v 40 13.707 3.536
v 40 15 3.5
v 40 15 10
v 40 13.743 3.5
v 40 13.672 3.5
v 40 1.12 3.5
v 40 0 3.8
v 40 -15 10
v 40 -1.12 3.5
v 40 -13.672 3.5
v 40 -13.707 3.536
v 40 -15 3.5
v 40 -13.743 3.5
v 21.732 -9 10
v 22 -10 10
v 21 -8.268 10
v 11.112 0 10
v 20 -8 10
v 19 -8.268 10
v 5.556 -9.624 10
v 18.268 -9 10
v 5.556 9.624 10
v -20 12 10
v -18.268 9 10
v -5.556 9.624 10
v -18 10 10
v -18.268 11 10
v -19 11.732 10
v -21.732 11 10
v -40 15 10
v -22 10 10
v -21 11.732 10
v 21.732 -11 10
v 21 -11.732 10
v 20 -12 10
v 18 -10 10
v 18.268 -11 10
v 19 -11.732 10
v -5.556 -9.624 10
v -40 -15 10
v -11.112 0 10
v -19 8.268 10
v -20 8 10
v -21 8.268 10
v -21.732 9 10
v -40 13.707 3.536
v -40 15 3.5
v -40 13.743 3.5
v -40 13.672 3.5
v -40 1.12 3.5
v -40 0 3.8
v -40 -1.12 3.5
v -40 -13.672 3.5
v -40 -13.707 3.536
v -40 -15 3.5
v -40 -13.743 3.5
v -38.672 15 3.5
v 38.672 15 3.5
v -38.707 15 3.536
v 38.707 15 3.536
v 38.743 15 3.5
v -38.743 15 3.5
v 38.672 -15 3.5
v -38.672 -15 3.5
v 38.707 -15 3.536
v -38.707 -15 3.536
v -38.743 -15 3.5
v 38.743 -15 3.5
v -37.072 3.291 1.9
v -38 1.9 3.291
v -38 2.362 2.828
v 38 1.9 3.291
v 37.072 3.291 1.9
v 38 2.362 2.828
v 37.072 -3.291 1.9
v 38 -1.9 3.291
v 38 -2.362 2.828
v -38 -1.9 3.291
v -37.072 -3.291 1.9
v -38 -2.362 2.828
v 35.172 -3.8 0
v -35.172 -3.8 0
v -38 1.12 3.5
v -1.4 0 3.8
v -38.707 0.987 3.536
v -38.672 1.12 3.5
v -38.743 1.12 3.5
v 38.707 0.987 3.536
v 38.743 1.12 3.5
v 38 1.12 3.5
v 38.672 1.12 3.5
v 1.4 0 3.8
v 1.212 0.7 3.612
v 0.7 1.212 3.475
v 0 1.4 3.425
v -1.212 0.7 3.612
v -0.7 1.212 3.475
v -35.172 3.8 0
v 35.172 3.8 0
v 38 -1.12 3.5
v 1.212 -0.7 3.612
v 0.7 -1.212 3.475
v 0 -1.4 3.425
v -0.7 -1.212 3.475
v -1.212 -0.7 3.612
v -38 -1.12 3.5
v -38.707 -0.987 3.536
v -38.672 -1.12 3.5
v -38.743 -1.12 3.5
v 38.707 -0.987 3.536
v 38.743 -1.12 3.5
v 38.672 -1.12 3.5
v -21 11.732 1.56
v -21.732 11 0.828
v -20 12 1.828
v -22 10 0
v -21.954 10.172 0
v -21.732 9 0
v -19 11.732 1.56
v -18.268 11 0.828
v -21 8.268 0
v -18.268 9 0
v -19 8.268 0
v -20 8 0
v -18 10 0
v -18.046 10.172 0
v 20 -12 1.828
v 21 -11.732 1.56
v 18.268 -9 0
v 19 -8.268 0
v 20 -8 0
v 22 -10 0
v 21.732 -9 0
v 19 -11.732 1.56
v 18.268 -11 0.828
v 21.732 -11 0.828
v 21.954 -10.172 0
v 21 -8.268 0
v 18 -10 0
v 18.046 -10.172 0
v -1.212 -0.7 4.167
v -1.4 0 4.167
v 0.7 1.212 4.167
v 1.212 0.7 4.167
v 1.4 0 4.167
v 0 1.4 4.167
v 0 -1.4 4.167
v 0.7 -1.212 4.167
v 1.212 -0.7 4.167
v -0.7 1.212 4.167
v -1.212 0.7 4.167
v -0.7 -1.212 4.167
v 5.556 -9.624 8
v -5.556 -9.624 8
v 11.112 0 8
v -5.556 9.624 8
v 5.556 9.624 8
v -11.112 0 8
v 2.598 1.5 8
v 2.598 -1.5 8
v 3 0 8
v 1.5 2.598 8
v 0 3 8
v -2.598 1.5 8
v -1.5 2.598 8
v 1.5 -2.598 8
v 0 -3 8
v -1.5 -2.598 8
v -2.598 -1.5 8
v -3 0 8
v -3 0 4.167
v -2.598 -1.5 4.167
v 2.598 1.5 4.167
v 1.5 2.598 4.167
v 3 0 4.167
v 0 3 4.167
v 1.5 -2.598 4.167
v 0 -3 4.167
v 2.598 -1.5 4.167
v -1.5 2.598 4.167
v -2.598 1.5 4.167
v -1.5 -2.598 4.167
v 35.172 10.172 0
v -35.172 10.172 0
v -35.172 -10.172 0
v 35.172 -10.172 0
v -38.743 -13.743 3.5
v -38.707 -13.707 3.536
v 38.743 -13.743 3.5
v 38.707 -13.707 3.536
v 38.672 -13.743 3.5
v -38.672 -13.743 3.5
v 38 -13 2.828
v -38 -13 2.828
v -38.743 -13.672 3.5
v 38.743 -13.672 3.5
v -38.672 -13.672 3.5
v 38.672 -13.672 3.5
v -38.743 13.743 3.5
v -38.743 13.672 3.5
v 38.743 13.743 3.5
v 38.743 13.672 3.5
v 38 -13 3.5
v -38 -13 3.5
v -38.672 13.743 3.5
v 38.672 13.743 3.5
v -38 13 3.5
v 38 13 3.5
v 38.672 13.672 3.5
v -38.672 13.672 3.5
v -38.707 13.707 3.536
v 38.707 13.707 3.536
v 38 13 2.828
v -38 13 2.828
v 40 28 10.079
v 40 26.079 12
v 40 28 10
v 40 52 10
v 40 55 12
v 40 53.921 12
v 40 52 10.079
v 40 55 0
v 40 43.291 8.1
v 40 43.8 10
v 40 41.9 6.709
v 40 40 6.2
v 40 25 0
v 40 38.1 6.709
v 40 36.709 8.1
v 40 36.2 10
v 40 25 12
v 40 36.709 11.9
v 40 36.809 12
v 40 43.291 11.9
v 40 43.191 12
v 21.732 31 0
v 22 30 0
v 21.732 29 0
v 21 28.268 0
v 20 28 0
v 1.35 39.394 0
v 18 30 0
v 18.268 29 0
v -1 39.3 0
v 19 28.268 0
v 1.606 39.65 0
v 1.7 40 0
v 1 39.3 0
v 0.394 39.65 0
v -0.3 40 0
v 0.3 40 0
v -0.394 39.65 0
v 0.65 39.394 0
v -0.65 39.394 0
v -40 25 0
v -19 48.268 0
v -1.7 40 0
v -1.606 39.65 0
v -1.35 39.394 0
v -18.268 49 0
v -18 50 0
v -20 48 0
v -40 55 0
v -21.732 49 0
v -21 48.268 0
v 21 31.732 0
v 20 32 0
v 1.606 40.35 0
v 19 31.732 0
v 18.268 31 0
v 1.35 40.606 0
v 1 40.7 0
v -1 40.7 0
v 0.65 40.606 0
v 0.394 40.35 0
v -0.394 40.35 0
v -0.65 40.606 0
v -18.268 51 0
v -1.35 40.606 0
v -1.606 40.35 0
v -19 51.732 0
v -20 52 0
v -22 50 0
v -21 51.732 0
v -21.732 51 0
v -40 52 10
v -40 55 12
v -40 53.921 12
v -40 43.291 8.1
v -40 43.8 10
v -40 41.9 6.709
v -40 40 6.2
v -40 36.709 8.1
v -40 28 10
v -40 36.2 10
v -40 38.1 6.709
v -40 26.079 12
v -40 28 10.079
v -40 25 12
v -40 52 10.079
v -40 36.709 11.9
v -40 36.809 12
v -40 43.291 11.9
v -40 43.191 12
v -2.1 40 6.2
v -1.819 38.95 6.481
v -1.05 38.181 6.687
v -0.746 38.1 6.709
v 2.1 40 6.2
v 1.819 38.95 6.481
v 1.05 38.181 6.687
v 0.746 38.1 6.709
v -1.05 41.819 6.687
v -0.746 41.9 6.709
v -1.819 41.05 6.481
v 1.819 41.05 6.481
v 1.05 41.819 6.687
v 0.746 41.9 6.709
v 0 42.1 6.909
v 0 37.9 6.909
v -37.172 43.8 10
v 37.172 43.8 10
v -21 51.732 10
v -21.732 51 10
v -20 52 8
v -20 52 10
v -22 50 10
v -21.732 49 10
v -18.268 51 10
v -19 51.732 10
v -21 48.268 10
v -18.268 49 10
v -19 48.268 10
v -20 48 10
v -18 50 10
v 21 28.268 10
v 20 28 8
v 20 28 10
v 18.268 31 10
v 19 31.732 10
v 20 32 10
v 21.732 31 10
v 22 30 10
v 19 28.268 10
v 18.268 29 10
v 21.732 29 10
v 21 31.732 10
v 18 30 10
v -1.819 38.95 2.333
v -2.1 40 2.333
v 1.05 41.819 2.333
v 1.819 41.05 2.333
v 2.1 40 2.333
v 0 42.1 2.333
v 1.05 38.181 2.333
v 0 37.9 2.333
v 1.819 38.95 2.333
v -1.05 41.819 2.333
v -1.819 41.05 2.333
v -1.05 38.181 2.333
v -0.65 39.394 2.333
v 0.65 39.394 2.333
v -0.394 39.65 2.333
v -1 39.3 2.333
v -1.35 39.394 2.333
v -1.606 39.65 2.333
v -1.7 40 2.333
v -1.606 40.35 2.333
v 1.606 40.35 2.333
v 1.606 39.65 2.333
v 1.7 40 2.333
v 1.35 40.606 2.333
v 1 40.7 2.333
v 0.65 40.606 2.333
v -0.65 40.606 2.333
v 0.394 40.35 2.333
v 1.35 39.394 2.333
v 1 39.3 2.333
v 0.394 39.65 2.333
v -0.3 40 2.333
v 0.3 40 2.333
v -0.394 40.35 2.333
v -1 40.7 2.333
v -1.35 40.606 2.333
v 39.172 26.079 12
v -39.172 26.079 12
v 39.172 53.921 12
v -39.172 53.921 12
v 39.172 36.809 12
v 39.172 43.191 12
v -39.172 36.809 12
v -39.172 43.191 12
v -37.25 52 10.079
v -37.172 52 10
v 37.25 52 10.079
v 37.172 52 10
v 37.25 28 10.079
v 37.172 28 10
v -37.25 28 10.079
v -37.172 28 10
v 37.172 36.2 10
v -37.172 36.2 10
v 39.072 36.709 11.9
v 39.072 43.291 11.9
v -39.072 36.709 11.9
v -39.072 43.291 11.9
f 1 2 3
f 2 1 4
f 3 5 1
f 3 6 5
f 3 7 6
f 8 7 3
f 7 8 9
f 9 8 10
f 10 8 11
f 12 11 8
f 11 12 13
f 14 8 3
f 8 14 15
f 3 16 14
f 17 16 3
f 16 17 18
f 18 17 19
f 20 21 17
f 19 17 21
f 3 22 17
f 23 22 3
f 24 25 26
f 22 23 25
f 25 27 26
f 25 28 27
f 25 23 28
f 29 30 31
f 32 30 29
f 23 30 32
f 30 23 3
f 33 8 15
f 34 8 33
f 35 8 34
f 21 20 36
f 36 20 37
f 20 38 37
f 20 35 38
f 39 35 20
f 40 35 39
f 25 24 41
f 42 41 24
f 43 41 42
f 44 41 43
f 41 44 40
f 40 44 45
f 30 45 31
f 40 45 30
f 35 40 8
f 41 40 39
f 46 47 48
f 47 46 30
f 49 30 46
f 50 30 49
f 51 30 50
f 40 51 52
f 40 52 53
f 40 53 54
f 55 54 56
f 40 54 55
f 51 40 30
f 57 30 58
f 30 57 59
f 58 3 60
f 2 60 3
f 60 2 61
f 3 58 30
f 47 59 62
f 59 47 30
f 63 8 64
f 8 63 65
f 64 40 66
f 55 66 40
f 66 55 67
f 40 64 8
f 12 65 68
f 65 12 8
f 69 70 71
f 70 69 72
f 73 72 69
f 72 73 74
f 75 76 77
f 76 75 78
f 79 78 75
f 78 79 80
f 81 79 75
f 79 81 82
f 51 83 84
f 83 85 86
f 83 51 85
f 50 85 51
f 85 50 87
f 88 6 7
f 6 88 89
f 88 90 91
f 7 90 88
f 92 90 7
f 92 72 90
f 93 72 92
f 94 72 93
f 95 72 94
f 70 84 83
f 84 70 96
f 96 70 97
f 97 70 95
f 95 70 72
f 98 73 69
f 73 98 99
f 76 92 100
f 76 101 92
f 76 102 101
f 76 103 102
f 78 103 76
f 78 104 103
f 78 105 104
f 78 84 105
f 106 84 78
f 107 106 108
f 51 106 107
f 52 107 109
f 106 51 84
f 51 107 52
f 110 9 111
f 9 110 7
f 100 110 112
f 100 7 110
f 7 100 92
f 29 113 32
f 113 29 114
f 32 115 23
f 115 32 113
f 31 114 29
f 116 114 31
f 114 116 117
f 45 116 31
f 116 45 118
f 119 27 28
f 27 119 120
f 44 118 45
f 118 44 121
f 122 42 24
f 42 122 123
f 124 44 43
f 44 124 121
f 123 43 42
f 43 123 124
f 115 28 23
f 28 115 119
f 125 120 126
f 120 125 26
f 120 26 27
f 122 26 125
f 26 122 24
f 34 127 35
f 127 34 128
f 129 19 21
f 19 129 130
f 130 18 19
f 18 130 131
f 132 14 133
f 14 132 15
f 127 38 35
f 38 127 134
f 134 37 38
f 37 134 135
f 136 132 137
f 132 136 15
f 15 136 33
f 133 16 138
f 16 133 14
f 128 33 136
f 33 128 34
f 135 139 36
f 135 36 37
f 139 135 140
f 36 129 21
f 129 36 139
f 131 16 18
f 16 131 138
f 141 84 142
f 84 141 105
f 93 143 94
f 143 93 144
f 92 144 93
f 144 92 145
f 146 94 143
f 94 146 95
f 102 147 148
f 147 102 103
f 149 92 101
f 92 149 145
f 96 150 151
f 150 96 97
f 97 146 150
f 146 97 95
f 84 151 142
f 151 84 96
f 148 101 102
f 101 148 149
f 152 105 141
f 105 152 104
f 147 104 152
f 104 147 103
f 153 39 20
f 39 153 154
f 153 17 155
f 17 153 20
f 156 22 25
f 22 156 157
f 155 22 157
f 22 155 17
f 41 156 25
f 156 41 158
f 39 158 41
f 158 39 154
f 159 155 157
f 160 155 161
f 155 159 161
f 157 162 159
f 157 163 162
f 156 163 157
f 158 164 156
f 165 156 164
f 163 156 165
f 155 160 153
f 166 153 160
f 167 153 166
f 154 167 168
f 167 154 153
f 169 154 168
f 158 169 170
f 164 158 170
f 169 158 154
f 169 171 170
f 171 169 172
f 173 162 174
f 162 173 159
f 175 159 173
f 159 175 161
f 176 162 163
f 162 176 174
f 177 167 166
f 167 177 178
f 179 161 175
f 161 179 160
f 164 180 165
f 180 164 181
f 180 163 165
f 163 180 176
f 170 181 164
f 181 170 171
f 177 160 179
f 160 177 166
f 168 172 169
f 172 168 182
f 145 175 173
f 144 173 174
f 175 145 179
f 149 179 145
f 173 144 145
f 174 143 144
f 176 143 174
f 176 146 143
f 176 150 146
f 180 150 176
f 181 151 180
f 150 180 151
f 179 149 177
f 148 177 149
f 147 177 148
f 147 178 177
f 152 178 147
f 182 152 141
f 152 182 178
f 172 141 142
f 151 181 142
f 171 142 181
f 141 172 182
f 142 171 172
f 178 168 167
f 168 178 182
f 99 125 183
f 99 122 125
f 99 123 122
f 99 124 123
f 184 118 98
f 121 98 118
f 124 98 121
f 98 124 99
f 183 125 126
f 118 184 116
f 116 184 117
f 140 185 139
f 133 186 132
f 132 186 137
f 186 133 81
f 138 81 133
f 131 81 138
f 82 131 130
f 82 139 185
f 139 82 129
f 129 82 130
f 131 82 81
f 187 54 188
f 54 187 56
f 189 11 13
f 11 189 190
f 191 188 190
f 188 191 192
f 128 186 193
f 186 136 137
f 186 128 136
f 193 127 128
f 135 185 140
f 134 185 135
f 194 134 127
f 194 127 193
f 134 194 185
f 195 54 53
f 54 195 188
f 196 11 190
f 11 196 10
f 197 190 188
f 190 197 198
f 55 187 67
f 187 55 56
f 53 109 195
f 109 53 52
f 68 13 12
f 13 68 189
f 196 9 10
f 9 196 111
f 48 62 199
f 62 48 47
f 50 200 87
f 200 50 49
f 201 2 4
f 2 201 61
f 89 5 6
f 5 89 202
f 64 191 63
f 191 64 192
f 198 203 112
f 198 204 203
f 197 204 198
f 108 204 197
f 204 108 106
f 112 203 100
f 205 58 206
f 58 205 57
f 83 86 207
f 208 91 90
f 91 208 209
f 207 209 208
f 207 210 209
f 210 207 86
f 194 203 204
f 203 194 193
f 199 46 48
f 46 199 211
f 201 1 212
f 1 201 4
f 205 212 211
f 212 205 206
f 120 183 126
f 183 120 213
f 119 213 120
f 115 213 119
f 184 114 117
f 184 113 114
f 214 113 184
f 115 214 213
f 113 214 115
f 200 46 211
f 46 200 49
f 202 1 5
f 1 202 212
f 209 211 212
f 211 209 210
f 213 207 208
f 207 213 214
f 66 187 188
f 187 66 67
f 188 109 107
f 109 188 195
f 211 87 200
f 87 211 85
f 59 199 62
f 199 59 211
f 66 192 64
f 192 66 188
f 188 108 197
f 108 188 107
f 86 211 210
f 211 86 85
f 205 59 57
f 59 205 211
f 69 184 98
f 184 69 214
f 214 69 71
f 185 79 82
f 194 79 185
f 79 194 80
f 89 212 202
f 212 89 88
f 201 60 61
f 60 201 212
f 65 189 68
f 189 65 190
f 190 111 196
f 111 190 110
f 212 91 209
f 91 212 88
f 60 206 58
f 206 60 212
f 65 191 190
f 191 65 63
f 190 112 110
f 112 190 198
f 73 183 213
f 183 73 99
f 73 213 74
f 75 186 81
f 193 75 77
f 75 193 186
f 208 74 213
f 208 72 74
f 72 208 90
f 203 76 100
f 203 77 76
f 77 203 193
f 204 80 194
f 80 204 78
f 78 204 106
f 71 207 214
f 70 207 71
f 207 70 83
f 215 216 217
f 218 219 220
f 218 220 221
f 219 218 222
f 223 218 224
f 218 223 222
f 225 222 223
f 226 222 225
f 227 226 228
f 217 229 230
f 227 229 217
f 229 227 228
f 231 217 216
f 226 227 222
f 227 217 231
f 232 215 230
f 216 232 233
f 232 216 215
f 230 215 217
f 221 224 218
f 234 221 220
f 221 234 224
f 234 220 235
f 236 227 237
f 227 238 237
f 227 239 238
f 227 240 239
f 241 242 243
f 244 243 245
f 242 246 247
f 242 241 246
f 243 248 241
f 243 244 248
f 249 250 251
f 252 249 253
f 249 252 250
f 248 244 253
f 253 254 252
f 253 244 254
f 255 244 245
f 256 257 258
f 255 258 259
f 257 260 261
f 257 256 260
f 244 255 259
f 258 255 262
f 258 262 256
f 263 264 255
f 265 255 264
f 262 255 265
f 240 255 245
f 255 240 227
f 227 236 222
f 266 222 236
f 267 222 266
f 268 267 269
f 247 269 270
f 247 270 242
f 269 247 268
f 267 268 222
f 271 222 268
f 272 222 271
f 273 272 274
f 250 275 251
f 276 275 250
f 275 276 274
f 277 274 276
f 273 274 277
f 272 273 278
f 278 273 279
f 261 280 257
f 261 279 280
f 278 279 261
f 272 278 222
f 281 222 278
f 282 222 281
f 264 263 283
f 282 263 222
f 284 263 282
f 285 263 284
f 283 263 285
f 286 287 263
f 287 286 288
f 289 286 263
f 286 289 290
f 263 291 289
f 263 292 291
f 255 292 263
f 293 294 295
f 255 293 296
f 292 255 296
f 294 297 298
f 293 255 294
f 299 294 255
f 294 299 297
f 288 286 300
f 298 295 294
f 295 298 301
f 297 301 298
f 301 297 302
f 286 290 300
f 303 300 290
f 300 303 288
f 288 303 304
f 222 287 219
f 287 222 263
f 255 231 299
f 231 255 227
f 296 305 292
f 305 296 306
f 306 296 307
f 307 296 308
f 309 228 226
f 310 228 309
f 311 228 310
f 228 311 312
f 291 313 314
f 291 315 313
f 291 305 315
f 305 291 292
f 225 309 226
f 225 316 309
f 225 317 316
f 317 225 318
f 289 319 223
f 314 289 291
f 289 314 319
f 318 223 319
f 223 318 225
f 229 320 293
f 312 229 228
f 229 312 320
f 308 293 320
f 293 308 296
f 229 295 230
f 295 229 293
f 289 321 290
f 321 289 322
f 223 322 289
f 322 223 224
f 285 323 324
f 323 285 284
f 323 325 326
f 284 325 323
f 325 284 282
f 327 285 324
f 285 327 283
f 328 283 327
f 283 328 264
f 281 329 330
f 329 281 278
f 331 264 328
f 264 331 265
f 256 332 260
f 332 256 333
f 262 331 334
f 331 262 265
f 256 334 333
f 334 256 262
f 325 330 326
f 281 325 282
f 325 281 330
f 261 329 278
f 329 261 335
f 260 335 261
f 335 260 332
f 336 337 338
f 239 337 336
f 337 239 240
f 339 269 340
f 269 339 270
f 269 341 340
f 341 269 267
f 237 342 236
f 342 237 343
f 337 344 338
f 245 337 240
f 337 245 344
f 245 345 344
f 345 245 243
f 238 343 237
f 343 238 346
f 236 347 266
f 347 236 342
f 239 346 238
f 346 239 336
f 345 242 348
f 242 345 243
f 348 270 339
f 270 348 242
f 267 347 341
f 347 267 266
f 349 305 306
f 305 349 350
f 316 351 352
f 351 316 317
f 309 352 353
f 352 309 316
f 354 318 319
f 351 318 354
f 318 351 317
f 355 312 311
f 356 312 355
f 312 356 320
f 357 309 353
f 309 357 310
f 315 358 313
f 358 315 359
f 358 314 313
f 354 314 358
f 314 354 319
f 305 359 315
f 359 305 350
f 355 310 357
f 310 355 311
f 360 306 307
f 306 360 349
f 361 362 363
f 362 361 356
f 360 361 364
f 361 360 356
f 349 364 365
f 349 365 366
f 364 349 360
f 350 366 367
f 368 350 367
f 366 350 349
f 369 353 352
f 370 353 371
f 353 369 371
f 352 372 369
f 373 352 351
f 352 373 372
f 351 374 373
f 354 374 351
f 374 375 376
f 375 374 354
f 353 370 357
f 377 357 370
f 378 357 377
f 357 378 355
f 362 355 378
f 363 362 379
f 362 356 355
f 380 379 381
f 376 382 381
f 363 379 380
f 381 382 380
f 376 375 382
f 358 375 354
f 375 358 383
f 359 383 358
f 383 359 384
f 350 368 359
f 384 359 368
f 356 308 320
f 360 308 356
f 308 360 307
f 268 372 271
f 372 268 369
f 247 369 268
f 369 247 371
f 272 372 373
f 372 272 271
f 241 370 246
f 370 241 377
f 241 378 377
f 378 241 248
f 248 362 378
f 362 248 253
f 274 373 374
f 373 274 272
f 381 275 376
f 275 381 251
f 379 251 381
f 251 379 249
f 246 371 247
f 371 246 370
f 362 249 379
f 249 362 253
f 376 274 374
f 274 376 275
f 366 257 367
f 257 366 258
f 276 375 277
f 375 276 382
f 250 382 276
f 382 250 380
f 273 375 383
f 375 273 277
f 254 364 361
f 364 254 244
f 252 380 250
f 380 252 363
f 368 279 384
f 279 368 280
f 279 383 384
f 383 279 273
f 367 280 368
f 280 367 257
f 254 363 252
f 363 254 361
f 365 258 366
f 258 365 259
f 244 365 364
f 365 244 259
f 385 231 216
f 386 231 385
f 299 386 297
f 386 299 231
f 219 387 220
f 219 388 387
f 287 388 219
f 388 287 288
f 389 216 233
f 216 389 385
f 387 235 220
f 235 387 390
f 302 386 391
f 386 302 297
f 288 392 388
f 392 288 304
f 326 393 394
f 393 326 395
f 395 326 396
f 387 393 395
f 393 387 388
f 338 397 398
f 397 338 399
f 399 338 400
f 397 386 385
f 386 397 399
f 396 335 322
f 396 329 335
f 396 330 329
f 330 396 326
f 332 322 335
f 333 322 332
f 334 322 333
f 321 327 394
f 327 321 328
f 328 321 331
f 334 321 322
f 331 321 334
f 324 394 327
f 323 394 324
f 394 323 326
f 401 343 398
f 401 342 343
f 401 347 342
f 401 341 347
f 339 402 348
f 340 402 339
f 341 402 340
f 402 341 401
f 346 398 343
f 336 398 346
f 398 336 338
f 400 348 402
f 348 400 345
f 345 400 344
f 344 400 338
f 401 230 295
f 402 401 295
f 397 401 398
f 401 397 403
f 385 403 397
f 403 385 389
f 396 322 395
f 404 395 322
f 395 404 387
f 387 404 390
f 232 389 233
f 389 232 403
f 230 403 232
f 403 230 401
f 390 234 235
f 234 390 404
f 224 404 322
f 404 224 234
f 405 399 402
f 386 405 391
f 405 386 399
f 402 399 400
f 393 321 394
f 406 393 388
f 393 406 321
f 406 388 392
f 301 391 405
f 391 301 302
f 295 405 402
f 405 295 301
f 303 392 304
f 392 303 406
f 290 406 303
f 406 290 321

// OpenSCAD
//
// Optical sensor to receive glass tube.
//
// dimensions subject to change, see variables
// at the bottom of this file
// 

  smooth = 12;  // Number of facets for round features
  hex = 6;
	length = 80; // mm   (76mm = 3") Main Block
	width  = 30; // mm
	thick = 20;  // mm
   dia  =  7.6; // 7.14 = (9*25.4)/32; // 6.4;  // 1/4 inch in mm
  sixscrewrad = 2; // 3.6mm = .146 = #6 screw hole
  heatsinkradius = 25.4*(7/16);
  ledradius = 3;
  phototransradius = 2.1;
  lighthole = 1.4;
  
  thickplus = thick + 2;  // plus margin
  lengthplus = length + 2;
  widthplus = width + 1;

module photohalf()
{
difference() {
	translate([0,width/2-1.5,0])
      cube([length,3,4],center=true);
	translate([0,width/2-3.2,2])
    rotate([-45,0,0])
      cube([length,3,4],center=true);
}

difference() {
	translate([0,1.5-width/2,0])
      cube([length,3,4],center=true);

	translate([0,3.2-width/2,2])
     rotate([45,0,0])
      cube([length,3,4],center=true);
}

difference() {

	sensor();
   translate([0,0,thick/2])
     cube([length+1,widthplus,thick],center=true);

   };
}

module ledhalf()
{

   difference() {
	  sensor();
     translate([0,0,-thick/2])
      cube([length+1,widthplus,thick],center=true);
	translate([0,2-width/2,0])
    rotate([45,0,0]) 
      cube([lengthplus,4,6],center=true);
	translate([0,-width/2,0.5])
      cube([lengthplus,4,6],center=true);
	translate([0,(width/2)-2,0])
    rotate([-45,0,0]) 
      cube([lengthplus,4,6],center=true);
	translate([0,width/2,0.5])
      cube([lengthplus,4,6],center=true);

    translate([2-length/2,0,0])
     rotate([-45,0,90])
	   cube([widthplus,4,6],center=true);
    translate([length/2-2,0,0])
     rotate([45,0,90])
	   cube([widthplus,4,6],center=true);
 translate([length/2,0,0.5])
  rotate([90,0,0])
   cube([4,6,widthplus],center=true);
 translate([-length/2,0,0.5])
  rotate([90,0,0])
   cube([4,6,widthplus],center=true);
}
}

module sensor()
{ 
  // Optical hole
	difference() {
	// BODY (to be subtracted from)
   cube([length,width,thick],center=true);


	// Glass Tube Conduit
	   rotate([0,90,0])
        cylinder(r=dia/2, h=lengthplus, center=true, $fn=smooth);
  // Slot
  //   translate([0,0.5+3*dia/2,0])
  //      cube([lengthplus,3*dia,dia+1],center=true);

  // Screw holes
    translate([-length/4,width/3,0])
     rotate([0,0,90])
       cylinder(r=sixscrewrad, h=thickplus, center=true, $fn=smooth);

     translate([length/4,-width/3,0])
     rotate([0,0,90])
       cylinder(r=sixscrewrad, h=thickplus, center=true, $fn=smooth);
  // Optical hole
     cylinder(r=lighthole, h=thickplus/2, center=true, $fn=smooth);

  // LED Holder
    translate([0,0,thick/2])
     cylinder(r=heatsinkradius, h=4, center=true, $fn=hex);

    translate([0,0,thick/3])
     cylinder(r=ledradius, h=thick/4, center=true, $fn=smooth);

  // Phototransistor holder
    translate([0,0,2-thick/3])
     cylinder(r=phototransradius, h=1+thick/4, center=true, $fn=smooth);

// Phototansistor leads
     translate([1,0,-thick/2]) 
       cylinder(r=0.7, h=thickplus/2, center=false, $fn=smooth);
     translate([-1,0,-thick/2]) 
       cylinder(r=0.7, h=thickplus/2, center=false, $fn=smooth);

  } // end difference


}

ledhalf();

translate([0,40,thick/2])
  rotate([0,0,0])
    photohalf();

difference(){
 translate([length/2,40,thick/2])
  rotate([90,45,0])
   cube([4,4,width],center=true);
 translate([2+length/2,40,thick/2])
  rotate([90,0,0])
   cube([4,6,widthplus],center=true);
 translate([length/2-2,40,5+thick/2])
  rotate([90,0,0])
   cube([4,6,widthplus],center=true);
 translate([0,40,thick/2])
  rotate([0,90,0])
     cylinder(r=dia/2, h=8+lengthplus, center=true, $fn=smooth);

}

difference() {
 translate([-length/2,40,thick/2])
  rotate([90,-45,0])
   cube([4,4,width],center=true);
 translate([-(2+length/2),40,thick/2])
  rotate([90,0,0])
   cube([4,6,widthplus],center=true);
 translate([2-length/2,40,5+thick/2])
  rotate([90,0,0])
   cube([4,6,widthplus],center=true);
 translate([0,40,thick/2])
  rotate([0,90,0])
     cylinder(r=dia/2, h=8+lengthplus, center=true, $fn=smooth);


}
